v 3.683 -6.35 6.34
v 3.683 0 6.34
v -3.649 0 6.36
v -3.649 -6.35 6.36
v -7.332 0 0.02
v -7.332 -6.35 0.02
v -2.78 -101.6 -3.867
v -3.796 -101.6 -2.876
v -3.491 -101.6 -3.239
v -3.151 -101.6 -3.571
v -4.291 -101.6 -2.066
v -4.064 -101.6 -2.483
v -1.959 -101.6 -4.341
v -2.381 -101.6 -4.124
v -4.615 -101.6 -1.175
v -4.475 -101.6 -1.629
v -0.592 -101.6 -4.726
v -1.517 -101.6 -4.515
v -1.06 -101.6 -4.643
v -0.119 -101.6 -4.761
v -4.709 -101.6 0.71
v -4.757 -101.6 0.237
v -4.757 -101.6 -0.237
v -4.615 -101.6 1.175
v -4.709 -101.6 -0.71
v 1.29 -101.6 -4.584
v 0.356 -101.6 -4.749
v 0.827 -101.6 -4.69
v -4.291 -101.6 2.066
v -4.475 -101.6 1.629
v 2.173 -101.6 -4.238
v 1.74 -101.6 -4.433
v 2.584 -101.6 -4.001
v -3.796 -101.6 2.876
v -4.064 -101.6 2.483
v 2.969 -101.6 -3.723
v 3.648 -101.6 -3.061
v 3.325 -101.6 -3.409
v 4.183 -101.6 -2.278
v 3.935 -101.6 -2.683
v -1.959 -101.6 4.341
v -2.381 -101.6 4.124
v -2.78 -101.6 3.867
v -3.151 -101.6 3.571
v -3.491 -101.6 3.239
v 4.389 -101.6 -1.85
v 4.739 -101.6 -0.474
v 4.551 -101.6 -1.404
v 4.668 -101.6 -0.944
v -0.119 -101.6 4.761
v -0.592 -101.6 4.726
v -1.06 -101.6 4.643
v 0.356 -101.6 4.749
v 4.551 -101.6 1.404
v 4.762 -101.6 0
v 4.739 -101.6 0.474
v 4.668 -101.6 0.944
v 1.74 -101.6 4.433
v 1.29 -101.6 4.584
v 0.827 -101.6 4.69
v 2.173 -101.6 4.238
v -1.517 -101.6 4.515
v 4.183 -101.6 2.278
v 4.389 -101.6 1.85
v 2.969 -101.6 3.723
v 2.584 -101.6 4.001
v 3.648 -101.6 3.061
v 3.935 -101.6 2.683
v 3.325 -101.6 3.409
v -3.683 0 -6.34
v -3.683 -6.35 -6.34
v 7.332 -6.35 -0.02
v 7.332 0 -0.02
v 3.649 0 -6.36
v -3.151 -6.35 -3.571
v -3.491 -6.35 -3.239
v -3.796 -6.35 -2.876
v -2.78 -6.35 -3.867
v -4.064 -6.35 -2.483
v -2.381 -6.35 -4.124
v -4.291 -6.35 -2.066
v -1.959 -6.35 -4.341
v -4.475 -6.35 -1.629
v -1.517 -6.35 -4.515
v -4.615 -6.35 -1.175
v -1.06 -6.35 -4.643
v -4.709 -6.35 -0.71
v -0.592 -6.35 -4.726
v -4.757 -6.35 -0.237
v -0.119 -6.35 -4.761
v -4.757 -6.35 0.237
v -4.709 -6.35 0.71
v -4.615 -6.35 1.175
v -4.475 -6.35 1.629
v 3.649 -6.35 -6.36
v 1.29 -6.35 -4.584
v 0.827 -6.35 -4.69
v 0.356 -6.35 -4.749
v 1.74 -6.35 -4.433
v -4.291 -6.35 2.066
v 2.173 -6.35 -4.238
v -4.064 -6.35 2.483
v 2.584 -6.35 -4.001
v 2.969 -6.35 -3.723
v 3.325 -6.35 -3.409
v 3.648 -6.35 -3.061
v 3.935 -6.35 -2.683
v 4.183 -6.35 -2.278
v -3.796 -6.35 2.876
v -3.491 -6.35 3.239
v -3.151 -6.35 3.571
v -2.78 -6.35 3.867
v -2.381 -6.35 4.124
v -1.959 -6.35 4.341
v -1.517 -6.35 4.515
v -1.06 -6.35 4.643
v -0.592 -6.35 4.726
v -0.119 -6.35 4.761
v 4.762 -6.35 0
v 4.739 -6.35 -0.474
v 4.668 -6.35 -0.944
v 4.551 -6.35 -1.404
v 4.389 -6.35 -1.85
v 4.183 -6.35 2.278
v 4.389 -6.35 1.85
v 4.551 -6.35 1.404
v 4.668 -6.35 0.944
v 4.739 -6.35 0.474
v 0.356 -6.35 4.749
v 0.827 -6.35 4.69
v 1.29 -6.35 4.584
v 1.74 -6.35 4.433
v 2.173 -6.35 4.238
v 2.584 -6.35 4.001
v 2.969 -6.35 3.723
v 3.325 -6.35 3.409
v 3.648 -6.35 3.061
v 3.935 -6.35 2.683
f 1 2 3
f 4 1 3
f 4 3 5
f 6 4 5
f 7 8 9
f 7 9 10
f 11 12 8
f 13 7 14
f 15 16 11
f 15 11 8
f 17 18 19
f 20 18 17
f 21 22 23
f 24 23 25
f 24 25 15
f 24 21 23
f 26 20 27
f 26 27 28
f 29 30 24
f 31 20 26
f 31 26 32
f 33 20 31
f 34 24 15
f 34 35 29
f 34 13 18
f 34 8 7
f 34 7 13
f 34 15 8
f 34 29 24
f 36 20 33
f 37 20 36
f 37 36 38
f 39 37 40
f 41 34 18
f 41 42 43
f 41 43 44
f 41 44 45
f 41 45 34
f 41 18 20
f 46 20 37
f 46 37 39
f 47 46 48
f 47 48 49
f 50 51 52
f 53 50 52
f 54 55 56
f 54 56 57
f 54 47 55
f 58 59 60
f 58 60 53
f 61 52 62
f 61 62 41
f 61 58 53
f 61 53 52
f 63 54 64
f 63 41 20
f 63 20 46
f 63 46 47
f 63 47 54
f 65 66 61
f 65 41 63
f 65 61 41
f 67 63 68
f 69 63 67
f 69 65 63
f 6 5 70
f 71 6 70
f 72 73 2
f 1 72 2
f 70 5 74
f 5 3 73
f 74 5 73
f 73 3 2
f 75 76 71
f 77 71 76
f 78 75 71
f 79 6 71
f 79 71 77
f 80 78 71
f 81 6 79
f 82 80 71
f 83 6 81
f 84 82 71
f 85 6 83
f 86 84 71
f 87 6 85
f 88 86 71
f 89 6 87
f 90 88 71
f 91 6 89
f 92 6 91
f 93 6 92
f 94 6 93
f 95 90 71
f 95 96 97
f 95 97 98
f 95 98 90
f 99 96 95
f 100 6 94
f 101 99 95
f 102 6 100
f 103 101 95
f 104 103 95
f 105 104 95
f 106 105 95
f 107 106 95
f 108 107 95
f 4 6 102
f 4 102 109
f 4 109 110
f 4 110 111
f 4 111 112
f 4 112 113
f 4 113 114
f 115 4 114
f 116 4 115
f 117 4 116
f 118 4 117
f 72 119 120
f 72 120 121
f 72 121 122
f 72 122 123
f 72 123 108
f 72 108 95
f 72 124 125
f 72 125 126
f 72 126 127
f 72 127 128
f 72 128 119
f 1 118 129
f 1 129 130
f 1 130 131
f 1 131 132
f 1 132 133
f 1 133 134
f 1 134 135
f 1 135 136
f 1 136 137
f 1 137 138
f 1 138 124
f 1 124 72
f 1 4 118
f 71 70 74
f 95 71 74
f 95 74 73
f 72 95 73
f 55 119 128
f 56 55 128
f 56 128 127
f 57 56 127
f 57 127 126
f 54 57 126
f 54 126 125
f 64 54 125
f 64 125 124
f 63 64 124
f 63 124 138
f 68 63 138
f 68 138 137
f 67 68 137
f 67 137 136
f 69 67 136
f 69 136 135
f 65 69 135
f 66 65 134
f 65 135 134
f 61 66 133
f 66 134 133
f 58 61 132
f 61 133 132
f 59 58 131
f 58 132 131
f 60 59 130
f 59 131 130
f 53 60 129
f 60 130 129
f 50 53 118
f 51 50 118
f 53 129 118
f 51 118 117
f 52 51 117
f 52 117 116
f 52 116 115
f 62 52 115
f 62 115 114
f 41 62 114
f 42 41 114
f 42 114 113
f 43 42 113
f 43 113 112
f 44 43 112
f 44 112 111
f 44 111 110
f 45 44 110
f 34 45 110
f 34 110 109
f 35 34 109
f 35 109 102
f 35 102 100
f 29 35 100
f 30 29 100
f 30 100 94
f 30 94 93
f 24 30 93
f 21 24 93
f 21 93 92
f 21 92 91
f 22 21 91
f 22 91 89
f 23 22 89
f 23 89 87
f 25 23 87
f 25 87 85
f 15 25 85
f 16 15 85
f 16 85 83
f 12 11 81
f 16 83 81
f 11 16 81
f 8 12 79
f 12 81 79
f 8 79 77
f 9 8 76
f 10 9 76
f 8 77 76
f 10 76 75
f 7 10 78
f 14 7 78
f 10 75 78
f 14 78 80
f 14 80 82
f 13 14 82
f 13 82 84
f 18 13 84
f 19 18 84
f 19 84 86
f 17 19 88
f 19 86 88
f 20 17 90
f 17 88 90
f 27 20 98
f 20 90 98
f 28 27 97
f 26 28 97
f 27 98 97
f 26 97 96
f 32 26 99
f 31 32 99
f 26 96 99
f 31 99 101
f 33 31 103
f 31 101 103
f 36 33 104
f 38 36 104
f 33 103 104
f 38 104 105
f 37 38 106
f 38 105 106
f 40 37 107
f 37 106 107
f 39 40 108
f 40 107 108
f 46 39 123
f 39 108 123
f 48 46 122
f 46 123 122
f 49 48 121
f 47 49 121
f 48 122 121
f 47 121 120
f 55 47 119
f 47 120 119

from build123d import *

# Parameters (mm, degrees)
F0_R     = 4.7625
F1_DEPTH = 101.6
F3_DEPTH = 6.35


with BuildPart() as f1:
    # F0 (on Front) → F1 (new body)
    with BuildSketch(Plane.XZ):
        Circle(F0_R)
    extrude(amount=F1_DEPTH)

    # F2 (on Front) → F3 (join)
    with BuildSketch(Plane.XZ):
        Polygon((7.332321, -0.019882), (3.683379, 6.340036), (-3.648942, 6.359918), (-7.332321, 0.019882), (-3.683379, -6.340036), (3.648942, -6.359918), align=None)
    extrude(amount=F3_DEPTH)


solid = f1.part
